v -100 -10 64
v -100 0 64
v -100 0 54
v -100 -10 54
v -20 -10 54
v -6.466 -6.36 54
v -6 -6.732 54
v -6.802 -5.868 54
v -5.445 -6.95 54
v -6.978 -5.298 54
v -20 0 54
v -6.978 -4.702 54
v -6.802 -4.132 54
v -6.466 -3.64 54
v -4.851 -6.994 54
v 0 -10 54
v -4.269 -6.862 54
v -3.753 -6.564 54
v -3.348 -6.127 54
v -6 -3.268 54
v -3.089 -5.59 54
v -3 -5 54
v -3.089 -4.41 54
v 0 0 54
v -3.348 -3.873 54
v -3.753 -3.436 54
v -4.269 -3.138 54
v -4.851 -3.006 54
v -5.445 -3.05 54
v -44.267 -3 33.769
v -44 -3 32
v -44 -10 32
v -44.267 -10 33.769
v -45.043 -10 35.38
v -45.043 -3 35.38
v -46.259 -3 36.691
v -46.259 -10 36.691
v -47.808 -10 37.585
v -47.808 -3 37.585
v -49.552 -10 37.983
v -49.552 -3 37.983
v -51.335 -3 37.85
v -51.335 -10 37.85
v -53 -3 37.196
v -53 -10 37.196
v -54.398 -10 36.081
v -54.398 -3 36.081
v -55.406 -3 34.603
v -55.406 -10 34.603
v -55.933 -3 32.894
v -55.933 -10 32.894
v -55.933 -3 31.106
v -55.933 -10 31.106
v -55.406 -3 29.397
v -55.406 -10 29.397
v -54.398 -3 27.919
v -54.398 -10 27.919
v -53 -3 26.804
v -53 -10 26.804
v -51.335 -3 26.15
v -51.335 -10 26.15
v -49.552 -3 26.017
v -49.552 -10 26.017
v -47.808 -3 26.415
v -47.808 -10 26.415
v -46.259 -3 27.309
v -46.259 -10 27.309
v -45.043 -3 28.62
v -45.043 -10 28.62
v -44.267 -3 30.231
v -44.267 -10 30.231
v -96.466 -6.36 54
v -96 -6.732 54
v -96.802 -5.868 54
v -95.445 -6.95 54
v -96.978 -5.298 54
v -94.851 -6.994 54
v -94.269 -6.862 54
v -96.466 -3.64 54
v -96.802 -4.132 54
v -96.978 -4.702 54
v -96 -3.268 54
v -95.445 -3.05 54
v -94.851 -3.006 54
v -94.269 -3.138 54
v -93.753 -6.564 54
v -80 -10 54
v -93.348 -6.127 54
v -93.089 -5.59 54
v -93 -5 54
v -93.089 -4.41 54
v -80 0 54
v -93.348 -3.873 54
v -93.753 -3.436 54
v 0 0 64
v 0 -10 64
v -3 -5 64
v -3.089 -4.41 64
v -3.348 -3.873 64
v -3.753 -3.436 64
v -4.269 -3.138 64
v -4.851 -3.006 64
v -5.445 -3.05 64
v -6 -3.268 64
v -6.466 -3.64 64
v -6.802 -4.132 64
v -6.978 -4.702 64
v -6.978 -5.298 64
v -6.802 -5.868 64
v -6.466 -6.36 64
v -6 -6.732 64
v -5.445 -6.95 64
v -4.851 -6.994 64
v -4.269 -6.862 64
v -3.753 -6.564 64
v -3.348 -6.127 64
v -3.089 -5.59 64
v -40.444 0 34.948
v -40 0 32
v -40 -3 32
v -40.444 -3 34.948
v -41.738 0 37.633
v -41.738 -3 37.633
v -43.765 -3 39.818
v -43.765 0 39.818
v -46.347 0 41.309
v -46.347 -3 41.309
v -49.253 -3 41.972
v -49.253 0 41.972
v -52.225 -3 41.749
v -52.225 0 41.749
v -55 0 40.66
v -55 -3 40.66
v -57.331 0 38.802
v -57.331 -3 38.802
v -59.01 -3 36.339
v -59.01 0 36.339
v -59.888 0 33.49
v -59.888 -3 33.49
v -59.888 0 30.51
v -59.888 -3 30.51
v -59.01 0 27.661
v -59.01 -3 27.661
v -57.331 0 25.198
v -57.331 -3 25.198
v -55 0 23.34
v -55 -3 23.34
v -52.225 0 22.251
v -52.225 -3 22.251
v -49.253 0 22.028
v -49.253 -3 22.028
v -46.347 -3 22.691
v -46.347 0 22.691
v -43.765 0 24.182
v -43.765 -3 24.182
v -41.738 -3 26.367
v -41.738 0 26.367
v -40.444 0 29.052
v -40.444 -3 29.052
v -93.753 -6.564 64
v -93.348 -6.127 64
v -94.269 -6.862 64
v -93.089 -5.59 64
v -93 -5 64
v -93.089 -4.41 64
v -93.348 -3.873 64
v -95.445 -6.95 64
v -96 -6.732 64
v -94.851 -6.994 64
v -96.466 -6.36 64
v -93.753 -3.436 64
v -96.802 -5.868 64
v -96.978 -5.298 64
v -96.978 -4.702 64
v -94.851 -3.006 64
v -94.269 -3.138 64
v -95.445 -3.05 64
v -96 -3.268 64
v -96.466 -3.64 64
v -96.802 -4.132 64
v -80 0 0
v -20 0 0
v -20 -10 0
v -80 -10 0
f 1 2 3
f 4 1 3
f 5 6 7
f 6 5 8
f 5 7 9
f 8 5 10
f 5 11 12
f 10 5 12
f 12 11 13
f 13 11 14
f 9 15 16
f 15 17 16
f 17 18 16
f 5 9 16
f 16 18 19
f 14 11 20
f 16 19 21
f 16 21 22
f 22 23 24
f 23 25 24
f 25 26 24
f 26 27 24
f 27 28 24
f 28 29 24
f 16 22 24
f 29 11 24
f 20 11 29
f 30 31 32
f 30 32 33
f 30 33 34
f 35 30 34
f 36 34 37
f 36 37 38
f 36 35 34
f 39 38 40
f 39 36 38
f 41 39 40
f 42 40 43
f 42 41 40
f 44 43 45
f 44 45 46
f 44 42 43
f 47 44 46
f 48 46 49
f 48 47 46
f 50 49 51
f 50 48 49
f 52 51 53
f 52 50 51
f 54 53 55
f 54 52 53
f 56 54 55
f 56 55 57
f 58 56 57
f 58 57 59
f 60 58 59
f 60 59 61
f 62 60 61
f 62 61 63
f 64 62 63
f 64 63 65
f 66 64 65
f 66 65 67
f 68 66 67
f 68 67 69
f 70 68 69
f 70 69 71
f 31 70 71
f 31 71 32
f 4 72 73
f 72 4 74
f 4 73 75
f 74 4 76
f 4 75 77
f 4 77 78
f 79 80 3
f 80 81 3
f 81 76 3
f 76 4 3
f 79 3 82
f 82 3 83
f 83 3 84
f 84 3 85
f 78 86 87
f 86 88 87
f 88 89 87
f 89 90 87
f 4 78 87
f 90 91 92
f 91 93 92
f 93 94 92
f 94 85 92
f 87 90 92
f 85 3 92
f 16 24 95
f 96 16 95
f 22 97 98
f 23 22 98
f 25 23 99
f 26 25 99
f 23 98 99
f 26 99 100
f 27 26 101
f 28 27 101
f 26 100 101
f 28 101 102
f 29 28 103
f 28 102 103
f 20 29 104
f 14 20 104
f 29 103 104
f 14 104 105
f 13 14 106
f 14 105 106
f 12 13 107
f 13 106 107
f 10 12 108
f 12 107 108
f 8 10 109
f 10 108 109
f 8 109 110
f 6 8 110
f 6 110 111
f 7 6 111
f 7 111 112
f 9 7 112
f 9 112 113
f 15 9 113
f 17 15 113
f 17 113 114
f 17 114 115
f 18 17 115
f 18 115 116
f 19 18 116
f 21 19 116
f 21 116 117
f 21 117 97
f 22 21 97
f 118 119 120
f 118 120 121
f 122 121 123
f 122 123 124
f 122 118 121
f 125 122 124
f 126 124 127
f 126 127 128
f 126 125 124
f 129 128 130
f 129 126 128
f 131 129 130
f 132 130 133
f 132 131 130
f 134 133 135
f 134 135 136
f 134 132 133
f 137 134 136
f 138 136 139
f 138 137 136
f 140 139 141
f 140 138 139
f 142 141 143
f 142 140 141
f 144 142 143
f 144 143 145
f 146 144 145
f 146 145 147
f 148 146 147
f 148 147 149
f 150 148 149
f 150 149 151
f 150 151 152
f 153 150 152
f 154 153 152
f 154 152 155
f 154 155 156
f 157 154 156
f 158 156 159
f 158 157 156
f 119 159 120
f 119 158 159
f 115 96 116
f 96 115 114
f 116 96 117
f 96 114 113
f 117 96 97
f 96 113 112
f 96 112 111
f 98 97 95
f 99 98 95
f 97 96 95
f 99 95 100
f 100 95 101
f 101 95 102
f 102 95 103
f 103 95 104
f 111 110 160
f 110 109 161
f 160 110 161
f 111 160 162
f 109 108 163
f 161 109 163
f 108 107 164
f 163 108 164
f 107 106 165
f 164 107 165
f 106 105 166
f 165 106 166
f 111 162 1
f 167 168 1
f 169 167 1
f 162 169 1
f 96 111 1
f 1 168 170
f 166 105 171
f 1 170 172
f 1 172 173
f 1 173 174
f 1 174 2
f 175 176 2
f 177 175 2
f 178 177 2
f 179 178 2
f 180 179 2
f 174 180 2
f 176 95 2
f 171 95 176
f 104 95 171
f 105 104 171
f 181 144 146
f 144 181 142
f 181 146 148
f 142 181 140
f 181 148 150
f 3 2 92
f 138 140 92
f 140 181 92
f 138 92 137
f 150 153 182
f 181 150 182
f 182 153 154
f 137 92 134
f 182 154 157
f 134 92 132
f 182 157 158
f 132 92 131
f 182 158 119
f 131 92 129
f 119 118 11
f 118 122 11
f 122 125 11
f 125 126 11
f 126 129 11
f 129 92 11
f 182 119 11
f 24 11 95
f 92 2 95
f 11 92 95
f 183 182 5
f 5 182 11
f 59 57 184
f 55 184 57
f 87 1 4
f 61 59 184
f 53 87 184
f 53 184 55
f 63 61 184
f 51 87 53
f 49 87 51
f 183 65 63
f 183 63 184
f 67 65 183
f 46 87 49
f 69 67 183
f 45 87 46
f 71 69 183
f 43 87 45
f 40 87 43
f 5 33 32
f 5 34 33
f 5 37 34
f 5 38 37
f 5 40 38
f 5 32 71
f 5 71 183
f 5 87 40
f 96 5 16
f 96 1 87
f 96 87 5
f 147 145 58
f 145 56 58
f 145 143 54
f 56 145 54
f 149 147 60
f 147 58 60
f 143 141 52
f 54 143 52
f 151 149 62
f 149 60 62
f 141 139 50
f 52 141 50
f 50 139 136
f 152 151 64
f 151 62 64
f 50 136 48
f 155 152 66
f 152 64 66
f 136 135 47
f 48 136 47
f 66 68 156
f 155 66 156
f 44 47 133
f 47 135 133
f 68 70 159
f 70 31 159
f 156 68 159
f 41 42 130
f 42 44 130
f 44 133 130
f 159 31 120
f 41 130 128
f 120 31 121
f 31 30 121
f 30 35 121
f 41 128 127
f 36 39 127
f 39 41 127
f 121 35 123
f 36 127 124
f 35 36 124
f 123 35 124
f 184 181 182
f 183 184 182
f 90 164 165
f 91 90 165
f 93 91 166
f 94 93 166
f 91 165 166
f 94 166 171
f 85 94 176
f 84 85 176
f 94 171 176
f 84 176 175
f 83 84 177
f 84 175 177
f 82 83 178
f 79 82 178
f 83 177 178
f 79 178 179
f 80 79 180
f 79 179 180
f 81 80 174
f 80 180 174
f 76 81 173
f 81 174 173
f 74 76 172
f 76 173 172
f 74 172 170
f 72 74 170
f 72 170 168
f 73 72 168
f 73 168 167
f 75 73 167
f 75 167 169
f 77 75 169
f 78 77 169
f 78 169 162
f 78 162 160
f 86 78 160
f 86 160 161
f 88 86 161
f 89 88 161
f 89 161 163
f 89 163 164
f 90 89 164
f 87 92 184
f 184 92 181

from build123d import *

# Parameters (mm, degrees)
F0_R     = 10
F0_R_2   = 6
F1_DEPTH = 10
F2_R     = 2
F3_DEPTH = 64.001
F4_DEPTH = 3


with BuildPart() as f1:
    # F0 (on Front) → F1 (new body)
    with BuildSketch(Plane.XZ):
        Polygon((0, 64), (-100, 64), (-100, 54), (-80, 54), (-80, 0), (-20, 0), (-20, 54), (0, 54), align=None)
        with Locations((-50, 32)):
            Circle(F0_R, mode=Mode.SUBTRACT)
        with Locations((-50, 32)):
            Circle(F0_R)
        with Locations((-50, 32)):
            Circle(F0_R_2, mode=Mode.SUBTRACT)
    extrude(amount=F1_DEPTH)

    # F2 (on face) → F3 (cut, through all)
    with BuildSketch(Plane.XY.offset(64)):
        with Locations((-95, -5)):
            Circle(F2_R)
        with Locations((-5, -5)):
            Circle(F2_R)
    extrude(amount=-F3_DEPTH, mode=Mode.SUBTRACT)

    # F0 (on Front) → F4 (cut)
    with BuildSketch(Plane.XZ):
        with Locations((-50, 32)):
            Circle(F0_R)
        with Locations((-50, 32)):
            Circle(F0_R_2, mode=Mode.SUBTRACT)
    extrude(amount=F4_DEPTH, mode=Mode.SUBTRACT)


solid = f1.part
